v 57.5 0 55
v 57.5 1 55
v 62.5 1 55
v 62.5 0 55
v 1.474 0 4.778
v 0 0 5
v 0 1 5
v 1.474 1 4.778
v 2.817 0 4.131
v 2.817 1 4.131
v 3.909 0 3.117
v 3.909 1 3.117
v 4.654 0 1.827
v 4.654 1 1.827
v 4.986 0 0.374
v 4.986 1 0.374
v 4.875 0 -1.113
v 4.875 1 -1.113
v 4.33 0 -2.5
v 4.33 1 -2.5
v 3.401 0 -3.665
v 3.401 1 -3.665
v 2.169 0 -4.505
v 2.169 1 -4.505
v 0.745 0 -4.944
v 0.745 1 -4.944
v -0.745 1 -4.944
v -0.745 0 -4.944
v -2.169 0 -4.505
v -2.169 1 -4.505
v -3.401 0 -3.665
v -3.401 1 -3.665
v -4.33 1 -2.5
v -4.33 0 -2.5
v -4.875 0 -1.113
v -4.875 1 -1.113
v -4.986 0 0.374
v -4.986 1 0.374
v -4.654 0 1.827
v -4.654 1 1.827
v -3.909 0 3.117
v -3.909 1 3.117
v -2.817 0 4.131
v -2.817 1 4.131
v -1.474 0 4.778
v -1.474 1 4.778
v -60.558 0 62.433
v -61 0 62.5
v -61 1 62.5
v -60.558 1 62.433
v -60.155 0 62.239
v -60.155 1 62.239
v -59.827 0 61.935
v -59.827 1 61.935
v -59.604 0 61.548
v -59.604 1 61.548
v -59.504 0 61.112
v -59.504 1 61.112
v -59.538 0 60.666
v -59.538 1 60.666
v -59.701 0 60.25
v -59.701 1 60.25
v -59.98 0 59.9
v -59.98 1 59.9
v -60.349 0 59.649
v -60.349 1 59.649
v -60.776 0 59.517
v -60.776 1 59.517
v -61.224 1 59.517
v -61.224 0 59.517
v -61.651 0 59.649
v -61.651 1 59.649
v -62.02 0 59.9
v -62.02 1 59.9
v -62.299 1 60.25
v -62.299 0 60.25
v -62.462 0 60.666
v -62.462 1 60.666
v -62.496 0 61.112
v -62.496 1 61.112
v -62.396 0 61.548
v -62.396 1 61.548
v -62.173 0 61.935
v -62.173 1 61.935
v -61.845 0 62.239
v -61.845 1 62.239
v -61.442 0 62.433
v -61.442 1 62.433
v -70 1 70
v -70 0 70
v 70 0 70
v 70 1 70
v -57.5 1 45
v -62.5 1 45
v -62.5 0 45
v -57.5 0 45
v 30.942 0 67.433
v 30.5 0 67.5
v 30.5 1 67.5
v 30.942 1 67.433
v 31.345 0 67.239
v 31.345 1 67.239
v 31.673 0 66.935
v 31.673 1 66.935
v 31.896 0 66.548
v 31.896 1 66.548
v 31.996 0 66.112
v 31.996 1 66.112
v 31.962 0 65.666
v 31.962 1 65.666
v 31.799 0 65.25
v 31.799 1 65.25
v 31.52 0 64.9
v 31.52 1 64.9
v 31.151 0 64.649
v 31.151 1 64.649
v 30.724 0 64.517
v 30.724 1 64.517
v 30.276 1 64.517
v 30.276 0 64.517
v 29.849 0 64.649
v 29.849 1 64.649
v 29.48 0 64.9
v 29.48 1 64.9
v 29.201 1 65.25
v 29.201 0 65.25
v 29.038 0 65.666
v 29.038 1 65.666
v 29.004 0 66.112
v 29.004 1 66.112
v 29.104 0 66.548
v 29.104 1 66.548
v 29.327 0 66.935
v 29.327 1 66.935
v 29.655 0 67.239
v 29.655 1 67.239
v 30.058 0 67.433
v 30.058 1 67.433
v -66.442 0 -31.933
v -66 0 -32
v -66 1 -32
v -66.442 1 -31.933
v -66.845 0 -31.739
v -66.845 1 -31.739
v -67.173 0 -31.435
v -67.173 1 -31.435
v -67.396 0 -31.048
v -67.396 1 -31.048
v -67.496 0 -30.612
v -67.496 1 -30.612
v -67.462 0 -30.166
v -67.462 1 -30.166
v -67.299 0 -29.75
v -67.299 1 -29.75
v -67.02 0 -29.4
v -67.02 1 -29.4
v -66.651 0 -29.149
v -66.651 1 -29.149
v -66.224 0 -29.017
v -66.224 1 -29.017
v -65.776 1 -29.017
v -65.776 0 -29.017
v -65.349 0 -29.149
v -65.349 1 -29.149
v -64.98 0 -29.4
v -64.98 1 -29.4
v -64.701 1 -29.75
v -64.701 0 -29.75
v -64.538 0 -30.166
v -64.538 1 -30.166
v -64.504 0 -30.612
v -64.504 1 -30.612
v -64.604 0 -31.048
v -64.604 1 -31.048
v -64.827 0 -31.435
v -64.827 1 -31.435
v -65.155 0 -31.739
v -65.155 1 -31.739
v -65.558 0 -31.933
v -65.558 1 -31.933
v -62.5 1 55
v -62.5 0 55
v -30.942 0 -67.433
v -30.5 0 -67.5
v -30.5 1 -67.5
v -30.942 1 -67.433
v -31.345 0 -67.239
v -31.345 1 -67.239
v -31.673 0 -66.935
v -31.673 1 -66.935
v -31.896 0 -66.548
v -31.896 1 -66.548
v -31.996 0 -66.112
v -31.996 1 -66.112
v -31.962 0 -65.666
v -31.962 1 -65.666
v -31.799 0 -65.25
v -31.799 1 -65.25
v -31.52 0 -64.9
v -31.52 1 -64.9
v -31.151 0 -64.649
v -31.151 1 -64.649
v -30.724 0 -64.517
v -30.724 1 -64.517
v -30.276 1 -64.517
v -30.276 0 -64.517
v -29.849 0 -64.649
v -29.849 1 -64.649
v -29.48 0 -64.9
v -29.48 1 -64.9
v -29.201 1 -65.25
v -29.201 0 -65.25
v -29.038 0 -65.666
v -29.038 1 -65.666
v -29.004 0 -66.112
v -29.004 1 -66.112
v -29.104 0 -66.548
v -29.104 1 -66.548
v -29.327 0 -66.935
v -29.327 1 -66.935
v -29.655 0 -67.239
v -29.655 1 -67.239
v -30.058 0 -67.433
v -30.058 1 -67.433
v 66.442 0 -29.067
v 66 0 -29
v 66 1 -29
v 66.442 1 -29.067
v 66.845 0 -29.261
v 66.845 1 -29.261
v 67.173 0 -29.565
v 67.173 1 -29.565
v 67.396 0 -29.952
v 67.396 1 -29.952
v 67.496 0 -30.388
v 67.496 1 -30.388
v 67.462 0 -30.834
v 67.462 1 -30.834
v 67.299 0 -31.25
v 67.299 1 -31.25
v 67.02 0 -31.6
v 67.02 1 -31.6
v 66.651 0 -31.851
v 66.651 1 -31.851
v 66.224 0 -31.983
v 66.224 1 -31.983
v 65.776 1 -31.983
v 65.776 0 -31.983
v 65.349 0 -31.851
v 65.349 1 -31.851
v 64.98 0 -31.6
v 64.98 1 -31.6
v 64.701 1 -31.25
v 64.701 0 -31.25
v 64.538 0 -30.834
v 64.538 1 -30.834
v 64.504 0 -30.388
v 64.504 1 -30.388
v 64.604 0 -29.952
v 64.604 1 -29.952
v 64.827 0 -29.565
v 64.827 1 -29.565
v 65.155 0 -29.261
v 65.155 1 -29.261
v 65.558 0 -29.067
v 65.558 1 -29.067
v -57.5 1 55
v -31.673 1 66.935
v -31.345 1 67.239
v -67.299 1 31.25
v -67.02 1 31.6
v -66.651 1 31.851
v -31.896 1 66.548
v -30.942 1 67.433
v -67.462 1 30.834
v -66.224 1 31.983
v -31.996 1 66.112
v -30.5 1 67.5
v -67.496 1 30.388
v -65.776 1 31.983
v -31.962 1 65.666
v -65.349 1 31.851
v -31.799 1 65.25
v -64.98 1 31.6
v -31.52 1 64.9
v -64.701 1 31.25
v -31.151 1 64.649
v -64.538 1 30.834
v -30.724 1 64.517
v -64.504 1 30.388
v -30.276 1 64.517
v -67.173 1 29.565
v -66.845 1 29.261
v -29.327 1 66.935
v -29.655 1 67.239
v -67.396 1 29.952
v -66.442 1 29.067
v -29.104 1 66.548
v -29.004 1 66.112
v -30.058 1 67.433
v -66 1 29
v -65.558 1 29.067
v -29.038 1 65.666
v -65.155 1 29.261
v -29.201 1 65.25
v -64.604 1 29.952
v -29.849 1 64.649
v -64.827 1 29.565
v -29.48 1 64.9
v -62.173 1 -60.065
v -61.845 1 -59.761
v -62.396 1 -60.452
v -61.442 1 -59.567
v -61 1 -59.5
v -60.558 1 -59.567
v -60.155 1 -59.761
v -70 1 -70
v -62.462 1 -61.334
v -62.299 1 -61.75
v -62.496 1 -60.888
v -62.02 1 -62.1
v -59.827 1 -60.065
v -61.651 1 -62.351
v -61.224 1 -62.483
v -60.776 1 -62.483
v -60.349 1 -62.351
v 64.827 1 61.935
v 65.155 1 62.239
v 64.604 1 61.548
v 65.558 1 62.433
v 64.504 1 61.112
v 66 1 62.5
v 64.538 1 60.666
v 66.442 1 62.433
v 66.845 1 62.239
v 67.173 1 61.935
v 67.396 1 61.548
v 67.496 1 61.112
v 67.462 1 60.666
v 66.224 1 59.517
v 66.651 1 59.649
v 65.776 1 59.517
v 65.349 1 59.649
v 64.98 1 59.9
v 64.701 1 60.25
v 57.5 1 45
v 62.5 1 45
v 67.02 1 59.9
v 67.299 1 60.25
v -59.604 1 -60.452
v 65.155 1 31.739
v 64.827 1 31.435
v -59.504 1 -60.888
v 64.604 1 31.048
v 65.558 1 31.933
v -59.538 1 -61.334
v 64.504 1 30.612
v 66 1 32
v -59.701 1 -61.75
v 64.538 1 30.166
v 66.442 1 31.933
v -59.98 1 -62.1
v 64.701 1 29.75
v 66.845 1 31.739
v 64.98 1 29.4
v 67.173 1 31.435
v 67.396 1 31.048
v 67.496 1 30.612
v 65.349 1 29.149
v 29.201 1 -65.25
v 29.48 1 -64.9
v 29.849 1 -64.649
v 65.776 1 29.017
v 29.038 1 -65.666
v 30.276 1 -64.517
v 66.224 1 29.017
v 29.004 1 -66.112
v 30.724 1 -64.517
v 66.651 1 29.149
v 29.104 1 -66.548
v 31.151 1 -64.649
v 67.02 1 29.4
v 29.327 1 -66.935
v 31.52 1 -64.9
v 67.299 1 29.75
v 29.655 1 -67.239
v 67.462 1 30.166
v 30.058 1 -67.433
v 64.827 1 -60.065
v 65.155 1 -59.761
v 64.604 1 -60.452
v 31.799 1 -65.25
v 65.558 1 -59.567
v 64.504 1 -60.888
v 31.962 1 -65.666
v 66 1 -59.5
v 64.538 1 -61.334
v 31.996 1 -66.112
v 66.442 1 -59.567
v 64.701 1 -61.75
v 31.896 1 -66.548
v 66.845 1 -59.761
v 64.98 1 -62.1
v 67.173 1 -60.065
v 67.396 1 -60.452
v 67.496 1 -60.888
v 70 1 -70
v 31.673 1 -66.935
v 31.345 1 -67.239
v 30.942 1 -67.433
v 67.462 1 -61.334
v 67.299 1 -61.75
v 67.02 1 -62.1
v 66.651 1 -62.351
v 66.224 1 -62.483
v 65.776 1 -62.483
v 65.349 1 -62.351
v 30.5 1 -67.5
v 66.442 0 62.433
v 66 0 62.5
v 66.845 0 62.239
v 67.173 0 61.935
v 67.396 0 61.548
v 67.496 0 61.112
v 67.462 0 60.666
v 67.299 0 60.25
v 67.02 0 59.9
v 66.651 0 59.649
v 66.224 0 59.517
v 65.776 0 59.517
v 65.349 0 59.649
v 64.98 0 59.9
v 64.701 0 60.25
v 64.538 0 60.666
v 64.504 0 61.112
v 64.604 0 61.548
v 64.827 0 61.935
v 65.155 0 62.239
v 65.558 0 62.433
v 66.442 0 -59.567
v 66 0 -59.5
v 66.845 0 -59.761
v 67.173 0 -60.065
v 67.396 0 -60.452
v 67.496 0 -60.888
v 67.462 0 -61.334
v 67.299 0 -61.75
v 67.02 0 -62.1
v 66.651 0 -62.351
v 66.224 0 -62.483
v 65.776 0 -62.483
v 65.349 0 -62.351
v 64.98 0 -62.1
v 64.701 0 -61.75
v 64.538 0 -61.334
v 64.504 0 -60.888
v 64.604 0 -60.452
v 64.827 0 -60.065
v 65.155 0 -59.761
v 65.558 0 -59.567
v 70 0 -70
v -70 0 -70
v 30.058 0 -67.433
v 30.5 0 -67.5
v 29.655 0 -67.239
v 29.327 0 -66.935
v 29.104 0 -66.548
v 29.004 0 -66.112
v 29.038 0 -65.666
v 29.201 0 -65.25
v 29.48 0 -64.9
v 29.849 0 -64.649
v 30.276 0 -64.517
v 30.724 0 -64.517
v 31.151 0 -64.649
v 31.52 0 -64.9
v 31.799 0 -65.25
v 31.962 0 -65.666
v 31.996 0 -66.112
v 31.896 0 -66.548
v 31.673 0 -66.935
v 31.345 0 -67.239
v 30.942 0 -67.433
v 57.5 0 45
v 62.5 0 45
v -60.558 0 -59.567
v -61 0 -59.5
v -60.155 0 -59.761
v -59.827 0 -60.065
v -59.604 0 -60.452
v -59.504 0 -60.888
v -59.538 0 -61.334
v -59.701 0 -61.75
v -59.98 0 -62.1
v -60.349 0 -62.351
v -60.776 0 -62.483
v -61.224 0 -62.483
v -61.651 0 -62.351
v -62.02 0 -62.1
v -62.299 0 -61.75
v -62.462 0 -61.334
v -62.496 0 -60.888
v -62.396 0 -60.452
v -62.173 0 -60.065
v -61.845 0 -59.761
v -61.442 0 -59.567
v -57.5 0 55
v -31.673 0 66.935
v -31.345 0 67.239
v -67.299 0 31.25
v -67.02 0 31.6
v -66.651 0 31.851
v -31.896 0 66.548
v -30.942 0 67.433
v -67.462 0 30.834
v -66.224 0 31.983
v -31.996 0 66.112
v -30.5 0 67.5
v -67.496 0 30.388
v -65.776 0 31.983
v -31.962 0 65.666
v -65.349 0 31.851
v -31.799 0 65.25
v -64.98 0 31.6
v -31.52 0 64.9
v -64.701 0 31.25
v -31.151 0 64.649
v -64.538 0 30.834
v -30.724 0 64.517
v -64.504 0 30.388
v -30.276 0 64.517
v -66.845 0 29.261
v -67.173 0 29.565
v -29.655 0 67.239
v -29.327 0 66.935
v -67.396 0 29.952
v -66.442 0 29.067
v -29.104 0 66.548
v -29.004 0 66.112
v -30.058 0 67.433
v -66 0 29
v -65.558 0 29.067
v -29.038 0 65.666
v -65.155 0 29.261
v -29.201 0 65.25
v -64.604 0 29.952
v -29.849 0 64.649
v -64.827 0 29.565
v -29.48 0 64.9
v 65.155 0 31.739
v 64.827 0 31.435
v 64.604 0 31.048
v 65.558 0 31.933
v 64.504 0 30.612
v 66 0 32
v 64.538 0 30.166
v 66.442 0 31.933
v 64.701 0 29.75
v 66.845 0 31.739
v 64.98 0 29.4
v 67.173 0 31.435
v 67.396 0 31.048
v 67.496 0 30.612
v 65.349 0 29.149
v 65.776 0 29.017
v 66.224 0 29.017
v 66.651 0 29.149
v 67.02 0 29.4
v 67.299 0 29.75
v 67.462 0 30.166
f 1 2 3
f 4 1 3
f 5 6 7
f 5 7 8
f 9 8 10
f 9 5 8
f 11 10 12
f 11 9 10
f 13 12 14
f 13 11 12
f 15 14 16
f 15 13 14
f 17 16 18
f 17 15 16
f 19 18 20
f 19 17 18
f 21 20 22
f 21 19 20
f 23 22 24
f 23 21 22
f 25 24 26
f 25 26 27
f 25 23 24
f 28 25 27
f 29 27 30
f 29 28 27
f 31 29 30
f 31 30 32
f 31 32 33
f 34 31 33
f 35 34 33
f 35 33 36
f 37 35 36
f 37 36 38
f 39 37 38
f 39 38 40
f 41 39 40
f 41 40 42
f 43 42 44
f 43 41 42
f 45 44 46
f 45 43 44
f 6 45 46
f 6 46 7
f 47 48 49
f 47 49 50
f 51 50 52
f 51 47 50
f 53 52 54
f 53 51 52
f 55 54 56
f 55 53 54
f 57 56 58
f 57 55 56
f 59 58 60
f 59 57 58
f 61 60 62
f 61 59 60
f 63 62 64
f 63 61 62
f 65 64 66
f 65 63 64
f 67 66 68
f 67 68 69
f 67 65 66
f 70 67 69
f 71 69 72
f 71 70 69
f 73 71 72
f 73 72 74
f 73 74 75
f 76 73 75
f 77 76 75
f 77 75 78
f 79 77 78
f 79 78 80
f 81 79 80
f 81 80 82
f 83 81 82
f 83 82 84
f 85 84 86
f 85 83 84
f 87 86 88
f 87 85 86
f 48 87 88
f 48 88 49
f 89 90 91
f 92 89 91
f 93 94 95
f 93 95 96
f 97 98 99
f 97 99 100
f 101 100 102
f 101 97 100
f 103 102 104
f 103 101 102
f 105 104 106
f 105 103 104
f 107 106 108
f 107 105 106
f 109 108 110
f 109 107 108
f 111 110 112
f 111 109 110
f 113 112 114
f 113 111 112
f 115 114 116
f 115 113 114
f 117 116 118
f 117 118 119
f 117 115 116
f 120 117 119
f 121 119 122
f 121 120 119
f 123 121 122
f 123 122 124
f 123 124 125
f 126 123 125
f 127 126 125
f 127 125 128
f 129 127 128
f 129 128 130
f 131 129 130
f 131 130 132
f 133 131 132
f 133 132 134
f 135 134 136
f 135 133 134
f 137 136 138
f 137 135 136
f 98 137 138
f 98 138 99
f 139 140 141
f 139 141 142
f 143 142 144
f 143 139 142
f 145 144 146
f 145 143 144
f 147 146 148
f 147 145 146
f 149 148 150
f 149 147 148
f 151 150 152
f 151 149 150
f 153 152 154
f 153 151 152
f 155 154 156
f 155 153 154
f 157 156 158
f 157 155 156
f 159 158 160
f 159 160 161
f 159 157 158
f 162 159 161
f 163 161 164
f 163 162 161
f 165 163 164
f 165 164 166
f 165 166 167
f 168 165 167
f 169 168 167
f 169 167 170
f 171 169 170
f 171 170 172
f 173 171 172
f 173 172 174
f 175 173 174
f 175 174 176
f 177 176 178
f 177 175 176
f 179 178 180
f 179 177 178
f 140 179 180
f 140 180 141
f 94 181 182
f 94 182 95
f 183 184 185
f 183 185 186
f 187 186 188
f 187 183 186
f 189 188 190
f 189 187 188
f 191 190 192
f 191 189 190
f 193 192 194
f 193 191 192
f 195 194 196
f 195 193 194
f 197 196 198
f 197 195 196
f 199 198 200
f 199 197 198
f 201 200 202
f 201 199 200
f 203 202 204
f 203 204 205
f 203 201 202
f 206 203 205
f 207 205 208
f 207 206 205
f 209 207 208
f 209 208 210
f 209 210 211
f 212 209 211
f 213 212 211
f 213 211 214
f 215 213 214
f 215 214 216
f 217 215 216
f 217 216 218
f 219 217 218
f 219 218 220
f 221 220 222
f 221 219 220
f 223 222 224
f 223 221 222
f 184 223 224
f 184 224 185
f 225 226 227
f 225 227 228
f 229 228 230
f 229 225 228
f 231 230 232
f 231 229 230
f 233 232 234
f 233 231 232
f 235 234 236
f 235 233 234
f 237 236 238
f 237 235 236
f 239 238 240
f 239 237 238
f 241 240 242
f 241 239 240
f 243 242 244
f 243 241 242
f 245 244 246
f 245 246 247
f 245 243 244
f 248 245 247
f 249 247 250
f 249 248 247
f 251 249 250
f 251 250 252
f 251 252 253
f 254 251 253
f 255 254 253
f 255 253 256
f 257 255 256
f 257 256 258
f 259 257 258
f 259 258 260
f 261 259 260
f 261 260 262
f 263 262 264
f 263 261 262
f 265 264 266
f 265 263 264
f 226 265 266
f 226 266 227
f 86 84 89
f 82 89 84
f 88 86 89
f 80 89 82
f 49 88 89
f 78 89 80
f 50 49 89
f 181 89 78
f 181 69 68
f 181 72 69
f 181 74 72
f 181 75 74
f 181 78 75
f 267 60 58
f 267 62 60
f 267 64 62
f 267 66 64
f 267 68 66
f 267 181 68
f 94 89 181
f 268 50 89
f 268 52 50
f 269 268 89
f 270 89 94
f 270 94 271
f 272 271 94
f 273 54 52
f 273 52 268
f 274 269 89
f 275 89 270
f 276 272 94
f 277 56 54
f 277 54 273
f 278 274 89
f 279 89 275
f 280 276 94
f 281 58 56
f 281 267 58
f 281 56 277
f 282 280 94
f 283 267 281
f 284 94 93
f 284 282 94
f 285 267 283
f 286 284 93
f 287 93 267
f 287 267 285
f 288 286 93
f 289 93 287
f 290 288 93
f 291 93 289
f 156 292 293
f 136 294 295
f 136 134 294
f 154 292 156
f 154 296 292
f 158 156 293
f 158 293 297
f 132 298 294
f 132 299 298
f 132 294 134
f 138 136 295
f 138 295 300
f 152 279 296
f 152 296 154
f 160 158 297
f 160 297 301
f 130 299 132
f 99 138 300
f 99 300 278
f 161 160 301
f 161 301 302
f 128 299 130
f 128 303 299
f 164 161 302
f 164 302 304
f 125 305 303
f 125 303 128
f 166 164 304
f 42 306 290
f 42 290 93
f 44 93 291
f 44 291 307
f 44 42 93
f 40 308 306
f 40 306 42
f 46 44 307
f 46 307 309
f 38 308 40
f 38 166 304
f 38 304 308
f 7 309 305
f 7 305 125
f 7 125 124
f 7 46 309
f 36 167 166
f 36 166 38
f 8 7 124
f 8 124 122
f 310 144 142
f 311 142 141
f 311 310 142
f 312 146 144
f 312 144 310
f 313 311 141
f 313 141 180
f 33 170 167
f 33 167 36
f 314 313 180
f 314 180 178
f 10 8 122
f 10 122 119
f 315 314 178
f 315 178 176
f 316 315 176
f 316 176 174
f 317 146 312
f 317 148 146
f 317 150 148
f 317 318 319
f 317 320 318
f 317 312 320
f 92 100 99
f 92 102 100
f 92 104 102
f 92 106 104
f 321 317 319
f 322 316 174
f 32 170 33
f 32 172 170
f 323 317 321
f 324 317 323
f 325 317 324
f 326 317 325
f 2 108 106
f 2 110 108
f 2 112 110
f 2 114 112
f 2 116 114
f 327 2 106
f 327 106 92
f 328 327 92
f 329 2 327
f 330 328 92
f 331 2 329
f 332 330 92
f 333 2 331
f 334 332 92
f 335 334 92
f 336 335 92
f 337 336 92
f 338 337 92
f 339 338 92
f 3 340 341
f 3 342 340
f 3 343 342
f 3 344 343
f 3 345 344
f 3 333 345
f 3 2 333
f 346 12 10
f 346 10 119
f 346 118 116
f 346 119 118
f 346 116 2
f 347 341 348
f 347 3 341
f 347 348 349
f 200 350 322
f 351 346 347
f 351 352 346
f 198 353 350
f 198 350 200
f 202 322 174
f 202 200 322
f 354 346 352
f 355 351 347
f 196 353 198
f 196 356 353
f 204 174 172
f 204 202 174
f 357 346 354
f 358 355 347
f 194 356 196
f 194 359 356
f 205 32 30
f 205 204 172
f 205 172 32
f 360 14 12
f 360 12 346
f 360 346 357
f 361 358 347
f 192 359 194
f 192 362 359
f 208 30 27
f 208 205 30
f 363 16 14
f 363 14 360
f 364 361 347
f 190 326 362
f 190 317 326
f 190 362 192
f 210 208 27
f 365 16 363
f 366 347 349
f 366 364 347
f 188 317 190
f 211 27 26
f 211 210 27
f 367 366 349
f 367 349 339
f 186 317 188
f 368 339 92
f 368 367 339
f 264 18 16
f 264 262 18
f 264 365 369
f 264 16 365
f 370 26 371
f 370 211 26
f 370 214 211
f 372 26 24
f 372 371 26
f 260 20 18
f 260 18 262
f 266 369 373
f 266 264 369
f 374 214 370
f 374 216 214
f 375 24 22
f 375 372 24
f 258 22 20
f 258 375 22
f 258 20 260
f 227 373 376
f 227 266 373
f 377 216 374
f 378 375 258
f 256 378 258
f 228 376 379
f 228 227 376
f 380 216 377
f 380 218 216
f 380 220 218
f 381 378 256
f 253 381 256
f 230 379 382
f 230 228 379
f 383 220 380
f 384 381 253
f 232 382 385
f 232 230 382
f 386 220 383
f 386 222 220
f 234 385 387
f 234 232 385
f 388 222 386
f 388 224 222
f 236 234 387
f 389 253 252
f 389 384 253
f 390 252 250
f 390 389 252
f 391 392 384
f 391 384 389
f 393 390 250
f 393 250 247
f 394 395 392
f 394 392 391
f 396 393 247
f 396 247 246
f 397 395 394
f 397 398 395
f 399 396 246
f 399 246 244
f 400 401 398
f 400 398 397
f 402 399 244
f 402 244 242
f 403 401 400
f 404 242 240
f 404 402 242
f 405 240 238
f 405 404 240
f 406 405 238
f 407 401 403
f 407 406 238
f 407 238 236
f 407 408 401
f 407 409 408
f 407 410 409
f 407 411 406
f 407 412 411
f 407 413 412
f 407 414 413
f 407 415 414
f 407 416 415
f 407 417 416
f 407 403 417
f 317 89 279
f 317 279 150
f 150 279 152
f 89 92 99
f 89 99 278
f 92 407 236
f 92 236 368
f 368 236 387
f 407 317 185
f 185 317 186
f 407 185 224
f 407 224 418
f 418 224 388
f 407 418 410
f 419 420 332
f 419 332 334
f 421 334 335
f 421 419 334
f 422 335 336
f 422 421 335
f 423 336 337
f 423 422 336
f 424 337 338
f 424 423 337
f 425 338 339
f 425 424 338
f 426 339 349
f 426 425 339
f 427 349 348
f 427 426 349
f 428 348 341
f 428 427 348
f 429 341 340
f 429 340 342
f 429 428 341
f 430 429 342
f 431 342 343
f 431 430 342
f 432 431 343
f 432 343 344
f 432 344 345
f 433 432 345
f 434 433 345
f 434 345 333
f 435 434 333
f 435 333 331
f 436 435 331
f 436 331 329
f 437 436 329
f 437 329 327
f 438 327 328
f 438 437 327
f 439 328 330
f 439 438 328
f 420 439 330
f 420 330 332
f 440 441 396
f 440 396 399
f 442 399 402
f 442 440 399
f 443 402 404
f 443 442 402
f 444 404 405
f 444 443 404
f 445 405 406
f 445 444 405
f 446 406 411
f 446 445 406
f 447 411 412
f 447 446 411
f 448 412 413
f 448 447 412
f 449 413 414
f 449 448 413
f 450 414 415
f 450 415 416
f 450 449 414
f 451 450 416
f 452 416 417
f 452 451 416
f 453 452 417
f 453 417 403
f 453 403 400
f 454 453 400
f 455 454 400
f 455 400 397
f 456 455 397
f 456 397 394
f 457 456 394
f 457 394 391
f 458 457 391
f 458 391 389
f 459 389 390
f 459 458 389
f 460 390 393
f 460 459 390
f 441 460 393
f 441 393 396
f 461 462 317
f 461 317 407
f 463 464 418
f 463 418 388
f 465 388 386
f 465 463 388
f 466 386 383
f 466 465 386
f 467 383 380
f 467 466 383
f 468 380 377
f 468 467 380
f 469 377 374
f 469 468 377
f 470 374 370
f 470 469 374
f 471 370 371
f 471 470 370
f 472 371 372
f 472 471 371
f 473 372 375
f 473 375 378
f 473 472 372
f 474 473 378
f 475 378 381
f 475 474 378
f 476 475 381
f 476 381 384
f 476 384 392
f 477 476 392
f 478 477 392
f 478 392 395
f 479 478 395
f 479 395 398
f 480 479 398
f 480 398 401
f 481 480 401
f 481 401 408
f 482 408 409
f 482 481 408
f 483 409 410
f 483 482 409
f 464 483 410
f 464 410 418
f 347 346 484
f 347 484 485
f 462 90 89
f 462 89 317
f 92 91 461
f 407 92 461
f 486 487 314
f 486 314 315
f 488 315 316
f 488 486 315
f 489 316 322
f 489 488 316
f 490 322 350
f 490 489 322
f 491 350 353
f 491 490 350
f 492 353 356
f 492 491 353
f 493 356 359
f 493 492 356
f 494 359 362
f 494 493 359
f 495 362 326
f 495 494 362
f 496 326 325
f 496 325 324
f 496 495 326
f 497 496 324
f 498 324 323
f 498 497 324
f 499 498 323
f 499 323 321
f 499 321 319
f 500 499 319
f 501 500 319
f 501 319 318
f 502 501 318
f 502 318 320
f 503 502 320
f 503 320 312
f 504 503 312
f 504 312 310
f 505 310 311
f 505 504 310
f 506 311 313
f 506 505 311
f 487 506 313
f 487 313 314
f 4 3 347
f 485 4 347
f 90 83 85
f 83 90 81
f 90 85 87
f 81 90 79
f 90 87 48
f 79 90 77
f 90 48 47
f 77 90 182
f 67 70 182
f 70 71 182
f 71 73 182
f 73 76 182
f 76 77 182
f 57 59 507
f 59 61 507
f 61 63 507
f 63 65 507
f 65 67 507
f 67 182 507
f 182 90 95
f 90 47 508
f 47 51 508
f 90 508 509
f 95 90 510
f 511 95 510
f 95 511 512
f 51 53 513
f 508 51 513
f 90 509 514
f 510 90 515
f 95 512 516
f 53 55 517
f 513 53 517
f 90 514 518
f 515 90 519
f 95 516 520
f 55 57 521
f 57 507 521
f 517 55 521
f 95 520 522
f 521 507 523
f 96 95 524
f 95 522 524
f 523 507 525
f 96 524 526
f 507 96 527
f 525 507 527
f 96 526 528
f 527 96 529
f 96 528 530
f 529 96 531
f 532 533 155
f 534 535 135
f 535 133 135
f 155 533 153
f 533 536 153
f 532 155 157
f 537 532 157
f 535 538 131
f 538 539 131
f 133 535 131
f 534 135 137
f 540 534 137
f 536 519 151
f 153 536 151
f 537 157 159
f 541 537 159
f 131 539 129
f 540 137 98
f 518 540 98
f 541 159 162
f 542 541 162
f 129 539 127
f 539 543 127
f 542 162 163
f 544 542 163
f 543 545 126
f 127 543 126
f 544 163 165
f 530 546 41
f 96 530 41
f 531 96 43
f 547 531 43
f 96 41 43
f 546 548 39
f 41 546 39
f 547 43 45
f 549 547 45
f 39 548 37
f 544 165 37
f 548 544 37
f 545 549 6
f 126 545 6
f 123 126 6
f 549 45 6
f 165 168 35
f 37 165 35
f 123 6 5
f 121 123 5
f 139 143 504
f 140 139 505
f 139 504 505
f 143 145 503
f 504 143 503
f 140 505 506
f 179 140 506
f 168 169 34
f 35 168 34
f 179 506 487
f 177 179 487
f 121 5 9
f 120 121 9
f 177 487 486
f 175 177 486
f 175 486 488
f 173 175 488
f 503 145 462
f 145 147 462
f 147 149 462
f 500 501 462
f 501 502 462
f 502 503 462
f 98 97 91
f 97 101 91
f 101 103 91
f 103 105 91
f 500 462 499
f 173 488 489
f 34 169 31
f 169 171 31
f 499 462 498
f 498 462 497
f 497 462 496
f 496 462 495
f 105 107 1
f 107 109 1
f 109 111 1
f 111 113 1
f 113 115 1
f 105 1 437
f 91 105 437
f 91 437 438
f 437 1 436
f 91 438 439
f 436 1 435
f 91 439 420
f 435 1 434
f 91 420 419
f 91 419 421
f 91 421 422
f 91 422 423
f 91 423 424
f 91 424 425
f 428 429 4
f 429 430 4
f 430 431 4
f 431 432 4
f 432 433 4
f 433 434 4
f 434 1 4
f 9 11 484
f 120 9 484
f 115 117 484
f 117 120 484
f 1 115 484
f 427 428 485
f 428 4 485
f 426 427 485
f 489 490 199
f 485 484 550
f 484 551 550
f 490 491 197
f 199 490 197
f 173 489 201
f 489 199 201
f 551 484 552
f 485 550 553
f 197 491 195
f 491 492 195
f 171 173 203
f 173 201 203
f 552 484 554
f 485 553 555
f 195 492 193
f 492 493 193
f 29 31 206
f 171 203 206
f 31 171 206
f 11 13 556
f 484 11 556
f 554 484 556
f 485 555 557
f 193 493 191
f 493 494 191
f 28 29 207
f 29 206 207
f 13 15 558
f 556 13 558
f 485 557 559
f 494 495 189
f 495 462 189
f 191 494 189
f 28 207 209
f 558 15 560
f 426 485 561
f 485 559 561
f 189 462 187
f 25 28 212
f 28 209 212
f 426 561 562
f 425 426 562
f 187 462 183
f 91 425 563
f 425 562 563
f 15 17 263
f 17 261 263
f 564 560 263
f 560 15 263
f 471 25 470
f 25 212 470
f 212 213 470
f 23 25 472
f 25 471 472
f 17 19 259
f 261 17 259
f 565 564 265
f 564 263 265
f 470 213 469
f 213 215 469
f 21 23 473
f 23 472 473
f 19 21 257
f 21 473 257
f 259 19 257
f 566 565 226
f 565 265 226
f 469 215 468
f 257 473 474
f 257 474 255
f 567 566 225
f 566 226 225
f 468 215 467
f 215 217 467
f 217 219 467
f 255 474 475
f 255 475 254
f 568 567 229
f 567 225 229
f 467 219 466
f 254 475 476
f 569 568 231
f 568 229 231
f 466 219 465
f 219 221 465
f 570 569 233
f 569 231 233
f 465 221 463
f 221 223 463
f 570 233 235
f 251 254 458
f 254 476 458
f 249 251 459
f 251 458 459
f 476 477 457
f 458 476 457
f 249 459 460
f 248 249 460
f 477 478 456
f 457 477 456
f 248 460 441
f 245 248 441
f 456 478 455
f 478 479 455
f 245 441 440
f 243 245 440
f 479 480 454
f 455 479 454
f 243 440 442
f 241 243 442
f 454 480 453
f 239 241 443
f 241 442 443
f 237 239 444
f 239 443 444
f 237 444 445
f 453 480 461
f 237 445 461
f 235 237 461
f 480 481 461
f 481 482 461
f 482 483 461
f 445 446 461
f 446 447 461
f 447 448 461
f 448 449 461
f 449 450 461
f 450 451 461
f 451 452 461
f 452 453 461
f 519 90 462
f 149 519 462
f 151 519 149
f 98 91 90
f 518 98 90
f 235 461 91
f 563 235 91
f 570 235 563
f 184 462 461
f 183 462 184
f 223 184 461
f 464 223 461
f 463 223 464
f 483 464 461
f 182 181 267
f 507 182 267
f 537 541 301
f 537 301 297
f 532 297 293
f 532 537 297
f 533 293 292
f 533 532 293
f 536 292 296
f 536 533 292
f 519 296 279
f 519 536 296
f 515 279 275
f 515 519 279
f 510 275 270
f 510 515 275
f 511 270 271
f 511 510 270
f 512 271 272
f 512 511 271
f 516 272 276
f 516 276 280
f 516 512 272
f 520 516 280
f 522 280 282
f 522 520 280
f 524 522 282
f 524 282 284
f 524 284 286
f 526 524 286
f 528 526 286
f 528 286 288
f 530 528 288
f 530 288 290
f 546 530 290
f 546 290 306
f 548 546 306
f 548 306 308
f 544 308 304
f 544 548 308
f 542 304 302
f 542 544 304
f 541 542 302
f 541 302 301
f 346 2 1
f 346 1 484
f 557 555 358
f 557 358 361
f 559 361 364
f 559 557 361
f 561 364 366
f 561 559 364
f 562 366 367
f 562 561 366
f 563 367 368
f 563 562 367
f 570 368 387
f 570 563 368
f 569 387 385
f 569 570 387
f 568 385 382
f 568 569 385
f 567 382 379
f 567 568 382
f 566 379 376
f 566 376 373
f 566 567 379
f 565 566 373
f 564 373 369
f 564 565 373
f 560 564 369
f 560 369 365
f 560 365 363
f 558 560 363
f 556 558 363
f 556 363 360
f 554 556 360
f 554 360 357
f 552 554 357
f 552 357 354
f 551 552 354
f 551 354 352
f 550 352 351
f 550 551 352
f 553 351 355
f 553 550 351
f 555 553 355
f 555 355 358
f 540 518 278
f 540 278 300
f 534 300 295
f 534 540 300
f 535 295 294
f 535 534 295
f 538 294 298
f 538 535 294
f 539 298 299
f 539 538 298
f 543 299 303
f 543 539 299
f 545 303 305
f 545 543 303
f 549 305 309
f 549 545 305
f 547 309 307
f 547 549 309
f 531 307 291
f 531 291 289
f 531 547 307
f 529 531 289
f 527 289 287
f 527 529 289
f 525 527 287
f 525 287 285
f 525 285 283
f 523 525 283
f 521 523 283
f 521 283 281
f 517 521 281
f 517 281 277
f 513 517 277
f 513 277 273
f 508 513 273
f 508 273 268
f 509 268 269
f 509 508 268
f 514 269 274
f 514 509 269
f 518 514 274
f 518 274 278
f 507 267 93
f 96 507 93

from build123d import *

# Parameters (mm, degrees)
CROQUIS1_W              = 140
CROQUIS1_H              = 140
CROQUIS1_R              = 1.5
CROQUIS1_R_2            = 5
SALIENTE_EXTRUIR1_DEPTH = 1
CROQUIS2_W              = 5
CROQUIS2_H              = 10
CORTAR_EXTRUIR1_DEPTH   = 5


with BuildPart() as part:
    # Croquis1 → Saliente-Extruir1 (new body)
    with BuildSketch(Plane(origin=(0, 0, 0), x_dir=(1, 0, 0), z_dir=(0, 1, 0))):
        Rectangle(CROQUIS1_W, CROQUIS1_H)
        with Locations(Location((-61, 61, 0), (0, 0, 270))):
            Circle(CROQUIS1_R, mode=Mode.SUBTRACT)
        with Locations(Location((66, 61, 0), (0, 0, 270))):
            Circle(CROQUIS1_R, mode=Mode.SUBTRACT)
        with Locations(Location((66, -61, 0), (0, 0, 270))):
            Circle(CROQUIS1_R, mode=Mode.SUBTRACT)
        with Locations(Location((-61, -61, 0), (0, 0, 270))):
            Circle(CROQUIS1_R, mode=Mode.SUBTRACT)
        with Locations(Location((66, 30.5, 0), (0, 0, 270))):
            Circle(CROQUIS1_R, mode=Mode.SUBTRACT)
        with Locations(Location((66, -30.5, 0), (0, 0, 270))):
            Circle(CROQUIS1_R, mode=Mode.SUBTRACT)
        with Locations(Location((-30.5, -66, 0), (0, 0, 270))):
            Circle(CROQUIS1_R, mode=Mode.SUBTRACT)
        with Locations(Location((30.5, -66, 0), (0, 0, 270))):
            Circle(CROQUIS1_R, mode=Mode.SUBTRACT)
        with Locations(Location((-30.5, 66, 0), (0, 0, 90))):
            Circle(CROQUIS1_R, mode=Mode.SUBTRACT)
        with Locations(Location((30.5, 66, 0), (0, 0, 90))):
            Circle(CROQUIS1_R, mode=Mode.SUBTRACT)
        with Locations(Location((-66, 30.5, 0), (0, 0, 90))):
            Circle(CROQUIS1_R, mode=Mode.SUBTRACT)
        with Locations(Location((-66, -30.5, 0), (0, 0, 90))):
            Circle(CROQUIS1_R, mode=Mode.SUBTRACT)
        with Locations(Location((0, 0, 0), (0, 0, 270))):
            Circle(CROQUIS1_R_2, mode=Mode.SUBTRACT)
    extrude(amount=SALIENTE_EXTRUIR1_DEPTH)

    # Croquis2 → Cortar-Extruir1 (cut)
    with BuildSketch(Plane(origin=(0, 1, 0), x_dir=(1, 0, 0), z_dir=(0, 1, 0))):
        with Locations((60, -50)):
            Rectangle(CROQUIS2_W, CROQUIS2_H)
        with Locations((-60, -50)):
            Rectangle(CROQUIS2_W, CROQUIS2_H)
    extrude(amount=-CORTAR_EXTRUIR1_DEPTH, mode=Mode.SUBTRACT)


solid = part.part
